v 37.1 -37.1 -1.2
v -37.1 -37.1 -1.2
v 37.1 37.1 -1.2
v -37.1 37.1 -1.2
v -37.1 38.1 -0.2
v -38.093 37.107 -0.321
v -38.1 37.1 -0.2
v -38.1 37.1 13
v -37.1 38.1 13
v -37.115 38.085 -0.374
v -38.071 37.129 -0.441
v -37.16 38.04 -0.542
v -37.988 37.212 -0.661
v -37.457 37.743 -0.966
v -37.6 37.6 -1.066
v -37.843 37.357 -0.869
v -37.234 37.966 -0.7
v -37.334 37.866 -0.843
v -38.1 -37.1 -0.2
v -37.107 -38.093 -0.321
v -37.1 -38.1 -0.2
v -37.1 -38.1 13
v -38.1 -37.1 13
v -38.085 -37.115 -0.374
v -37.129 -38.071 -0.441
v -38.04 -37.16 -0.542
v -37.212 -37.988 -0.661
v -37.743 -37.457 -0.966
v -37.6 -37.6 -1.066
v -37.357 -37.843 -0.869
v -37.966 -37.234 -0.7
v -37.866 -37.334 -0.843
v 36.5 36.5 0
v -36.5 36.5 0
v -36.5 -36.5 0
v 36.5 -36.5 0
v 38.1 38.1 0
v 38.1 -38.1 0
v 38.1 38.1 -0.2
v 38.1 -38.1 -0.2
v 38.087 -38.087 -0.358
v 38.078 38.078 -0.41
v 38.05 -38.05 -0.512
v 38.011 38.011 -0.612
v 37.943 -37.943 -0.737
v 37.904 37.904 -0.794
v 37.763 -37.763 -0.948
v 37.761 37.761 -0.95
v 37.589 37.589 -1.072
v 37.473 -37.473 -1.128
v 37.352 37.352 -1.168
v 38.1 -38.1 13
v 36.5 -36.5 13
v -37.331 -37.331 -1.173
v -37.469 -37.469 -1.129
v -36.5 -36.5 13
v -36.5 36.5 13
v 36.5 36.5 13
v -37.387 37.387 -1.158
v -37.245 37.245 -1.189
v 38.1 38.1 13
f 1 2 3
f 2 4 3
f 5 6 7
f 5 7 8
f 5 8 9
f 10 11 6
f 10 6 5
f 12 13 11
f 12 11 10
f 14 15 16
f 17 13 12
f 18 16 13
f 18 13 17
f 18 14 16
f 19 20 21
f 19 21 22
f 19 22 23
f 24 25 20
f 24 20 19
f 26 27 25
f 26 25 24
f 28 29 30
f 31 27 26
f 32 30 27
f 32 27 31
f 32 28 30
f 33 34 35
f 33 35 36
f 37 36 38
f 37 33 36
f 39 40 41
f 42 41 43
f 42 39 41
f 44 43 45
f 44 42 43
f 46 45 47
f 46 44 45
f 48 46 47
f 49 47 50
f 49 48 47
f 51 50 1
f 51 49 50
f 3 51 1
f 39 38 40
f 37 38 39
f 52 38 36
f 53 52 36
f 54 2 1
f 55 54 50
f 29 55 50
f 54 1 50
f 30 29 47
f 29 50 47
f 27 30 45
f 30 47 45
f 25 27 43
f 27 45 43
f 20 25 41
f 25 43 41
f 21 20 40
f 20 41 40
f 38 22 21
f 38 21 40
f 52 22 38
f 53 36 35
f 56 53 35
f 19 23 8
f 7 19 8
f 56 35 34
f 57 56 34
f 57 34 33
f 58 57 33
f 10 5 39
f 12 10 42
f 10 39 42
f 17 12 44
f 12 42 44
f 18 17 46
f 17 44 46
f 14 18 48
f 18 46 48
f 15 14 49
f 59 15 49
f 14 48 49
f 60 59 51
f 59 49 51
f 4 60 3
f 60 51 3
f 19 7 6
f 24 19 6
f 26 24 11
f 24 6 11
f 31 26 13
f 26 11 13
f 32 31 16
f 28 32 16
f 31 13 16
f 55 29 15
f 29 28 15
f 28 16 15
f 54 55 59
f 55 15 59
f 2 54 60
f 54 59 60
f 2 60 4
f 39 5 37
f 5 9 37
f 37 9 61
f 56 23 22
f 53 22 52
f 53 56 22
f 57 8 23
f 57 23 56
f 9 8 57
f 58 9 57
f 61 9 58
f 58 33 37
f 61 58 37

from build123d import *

# Parameters (mm, degrees)
F1_DEPTH    = 13
F2_W        = 76.2
F2_H        = 76.2
F3_DEPTH    = 1.2
F4_R        = 1
F5_T1_DEPTH = 18.3433659759


# Not quite as in the source:
# - a fillet or chamfer that OpenCascade refuses, or shapes differently, is made with other operations: its cross-section is extruded or revolved along the edge and cut away or added


with BuildPart() as f1:
    # F0 (on Top) → F1 (new body)
    with BuildSketch(Plane.XY):
        Polygon((-36.5, 36.5), (36.5, 36.5), (38.1, 38.1), (-38.1, 38.1), (-38.1, -38.1), (38.1, -38.1), (36.5, -36.5), (-36.5, -36.5), align=None)
    extrude(amount=F1_DEPTH)

    # F2 (on Top) → F3 (join)
    with BuildSketch(Plane.XY):
        Rectangle(F2_W, F2_H)
    extrude(amount=-F3_DEPTH)

    # F4
    f4_edges = [f1.edges().sort_by_distance(p)[0] for p in [
        (0, -38.1, -1.2),
        (38.1, 0, -1.2),
        (0, 38.1, -1.2),
        (-38.1, 0, -1.2),
    ]]
    fillet(f4_edges, radius=F4_R)

    # F5: chamfer of 1 on 2 edges, made by hand

    # F5_s2 → F5_t1 (cut)
    with BuildSketch(Plane.XY.offset(-2.771682988)):
        Polygon((-37.1, -38.1), (-38.1, -37.1), (-38.1, -38.1), align=None)
        Polygon((-38.1, 37.1), (-37.1, 38.1), (-38.1, 38.1), align=None)
    extrude(amount=F5_T1_DEPTH, mode=Mode.SUBTRACT)


solid = f1.part
